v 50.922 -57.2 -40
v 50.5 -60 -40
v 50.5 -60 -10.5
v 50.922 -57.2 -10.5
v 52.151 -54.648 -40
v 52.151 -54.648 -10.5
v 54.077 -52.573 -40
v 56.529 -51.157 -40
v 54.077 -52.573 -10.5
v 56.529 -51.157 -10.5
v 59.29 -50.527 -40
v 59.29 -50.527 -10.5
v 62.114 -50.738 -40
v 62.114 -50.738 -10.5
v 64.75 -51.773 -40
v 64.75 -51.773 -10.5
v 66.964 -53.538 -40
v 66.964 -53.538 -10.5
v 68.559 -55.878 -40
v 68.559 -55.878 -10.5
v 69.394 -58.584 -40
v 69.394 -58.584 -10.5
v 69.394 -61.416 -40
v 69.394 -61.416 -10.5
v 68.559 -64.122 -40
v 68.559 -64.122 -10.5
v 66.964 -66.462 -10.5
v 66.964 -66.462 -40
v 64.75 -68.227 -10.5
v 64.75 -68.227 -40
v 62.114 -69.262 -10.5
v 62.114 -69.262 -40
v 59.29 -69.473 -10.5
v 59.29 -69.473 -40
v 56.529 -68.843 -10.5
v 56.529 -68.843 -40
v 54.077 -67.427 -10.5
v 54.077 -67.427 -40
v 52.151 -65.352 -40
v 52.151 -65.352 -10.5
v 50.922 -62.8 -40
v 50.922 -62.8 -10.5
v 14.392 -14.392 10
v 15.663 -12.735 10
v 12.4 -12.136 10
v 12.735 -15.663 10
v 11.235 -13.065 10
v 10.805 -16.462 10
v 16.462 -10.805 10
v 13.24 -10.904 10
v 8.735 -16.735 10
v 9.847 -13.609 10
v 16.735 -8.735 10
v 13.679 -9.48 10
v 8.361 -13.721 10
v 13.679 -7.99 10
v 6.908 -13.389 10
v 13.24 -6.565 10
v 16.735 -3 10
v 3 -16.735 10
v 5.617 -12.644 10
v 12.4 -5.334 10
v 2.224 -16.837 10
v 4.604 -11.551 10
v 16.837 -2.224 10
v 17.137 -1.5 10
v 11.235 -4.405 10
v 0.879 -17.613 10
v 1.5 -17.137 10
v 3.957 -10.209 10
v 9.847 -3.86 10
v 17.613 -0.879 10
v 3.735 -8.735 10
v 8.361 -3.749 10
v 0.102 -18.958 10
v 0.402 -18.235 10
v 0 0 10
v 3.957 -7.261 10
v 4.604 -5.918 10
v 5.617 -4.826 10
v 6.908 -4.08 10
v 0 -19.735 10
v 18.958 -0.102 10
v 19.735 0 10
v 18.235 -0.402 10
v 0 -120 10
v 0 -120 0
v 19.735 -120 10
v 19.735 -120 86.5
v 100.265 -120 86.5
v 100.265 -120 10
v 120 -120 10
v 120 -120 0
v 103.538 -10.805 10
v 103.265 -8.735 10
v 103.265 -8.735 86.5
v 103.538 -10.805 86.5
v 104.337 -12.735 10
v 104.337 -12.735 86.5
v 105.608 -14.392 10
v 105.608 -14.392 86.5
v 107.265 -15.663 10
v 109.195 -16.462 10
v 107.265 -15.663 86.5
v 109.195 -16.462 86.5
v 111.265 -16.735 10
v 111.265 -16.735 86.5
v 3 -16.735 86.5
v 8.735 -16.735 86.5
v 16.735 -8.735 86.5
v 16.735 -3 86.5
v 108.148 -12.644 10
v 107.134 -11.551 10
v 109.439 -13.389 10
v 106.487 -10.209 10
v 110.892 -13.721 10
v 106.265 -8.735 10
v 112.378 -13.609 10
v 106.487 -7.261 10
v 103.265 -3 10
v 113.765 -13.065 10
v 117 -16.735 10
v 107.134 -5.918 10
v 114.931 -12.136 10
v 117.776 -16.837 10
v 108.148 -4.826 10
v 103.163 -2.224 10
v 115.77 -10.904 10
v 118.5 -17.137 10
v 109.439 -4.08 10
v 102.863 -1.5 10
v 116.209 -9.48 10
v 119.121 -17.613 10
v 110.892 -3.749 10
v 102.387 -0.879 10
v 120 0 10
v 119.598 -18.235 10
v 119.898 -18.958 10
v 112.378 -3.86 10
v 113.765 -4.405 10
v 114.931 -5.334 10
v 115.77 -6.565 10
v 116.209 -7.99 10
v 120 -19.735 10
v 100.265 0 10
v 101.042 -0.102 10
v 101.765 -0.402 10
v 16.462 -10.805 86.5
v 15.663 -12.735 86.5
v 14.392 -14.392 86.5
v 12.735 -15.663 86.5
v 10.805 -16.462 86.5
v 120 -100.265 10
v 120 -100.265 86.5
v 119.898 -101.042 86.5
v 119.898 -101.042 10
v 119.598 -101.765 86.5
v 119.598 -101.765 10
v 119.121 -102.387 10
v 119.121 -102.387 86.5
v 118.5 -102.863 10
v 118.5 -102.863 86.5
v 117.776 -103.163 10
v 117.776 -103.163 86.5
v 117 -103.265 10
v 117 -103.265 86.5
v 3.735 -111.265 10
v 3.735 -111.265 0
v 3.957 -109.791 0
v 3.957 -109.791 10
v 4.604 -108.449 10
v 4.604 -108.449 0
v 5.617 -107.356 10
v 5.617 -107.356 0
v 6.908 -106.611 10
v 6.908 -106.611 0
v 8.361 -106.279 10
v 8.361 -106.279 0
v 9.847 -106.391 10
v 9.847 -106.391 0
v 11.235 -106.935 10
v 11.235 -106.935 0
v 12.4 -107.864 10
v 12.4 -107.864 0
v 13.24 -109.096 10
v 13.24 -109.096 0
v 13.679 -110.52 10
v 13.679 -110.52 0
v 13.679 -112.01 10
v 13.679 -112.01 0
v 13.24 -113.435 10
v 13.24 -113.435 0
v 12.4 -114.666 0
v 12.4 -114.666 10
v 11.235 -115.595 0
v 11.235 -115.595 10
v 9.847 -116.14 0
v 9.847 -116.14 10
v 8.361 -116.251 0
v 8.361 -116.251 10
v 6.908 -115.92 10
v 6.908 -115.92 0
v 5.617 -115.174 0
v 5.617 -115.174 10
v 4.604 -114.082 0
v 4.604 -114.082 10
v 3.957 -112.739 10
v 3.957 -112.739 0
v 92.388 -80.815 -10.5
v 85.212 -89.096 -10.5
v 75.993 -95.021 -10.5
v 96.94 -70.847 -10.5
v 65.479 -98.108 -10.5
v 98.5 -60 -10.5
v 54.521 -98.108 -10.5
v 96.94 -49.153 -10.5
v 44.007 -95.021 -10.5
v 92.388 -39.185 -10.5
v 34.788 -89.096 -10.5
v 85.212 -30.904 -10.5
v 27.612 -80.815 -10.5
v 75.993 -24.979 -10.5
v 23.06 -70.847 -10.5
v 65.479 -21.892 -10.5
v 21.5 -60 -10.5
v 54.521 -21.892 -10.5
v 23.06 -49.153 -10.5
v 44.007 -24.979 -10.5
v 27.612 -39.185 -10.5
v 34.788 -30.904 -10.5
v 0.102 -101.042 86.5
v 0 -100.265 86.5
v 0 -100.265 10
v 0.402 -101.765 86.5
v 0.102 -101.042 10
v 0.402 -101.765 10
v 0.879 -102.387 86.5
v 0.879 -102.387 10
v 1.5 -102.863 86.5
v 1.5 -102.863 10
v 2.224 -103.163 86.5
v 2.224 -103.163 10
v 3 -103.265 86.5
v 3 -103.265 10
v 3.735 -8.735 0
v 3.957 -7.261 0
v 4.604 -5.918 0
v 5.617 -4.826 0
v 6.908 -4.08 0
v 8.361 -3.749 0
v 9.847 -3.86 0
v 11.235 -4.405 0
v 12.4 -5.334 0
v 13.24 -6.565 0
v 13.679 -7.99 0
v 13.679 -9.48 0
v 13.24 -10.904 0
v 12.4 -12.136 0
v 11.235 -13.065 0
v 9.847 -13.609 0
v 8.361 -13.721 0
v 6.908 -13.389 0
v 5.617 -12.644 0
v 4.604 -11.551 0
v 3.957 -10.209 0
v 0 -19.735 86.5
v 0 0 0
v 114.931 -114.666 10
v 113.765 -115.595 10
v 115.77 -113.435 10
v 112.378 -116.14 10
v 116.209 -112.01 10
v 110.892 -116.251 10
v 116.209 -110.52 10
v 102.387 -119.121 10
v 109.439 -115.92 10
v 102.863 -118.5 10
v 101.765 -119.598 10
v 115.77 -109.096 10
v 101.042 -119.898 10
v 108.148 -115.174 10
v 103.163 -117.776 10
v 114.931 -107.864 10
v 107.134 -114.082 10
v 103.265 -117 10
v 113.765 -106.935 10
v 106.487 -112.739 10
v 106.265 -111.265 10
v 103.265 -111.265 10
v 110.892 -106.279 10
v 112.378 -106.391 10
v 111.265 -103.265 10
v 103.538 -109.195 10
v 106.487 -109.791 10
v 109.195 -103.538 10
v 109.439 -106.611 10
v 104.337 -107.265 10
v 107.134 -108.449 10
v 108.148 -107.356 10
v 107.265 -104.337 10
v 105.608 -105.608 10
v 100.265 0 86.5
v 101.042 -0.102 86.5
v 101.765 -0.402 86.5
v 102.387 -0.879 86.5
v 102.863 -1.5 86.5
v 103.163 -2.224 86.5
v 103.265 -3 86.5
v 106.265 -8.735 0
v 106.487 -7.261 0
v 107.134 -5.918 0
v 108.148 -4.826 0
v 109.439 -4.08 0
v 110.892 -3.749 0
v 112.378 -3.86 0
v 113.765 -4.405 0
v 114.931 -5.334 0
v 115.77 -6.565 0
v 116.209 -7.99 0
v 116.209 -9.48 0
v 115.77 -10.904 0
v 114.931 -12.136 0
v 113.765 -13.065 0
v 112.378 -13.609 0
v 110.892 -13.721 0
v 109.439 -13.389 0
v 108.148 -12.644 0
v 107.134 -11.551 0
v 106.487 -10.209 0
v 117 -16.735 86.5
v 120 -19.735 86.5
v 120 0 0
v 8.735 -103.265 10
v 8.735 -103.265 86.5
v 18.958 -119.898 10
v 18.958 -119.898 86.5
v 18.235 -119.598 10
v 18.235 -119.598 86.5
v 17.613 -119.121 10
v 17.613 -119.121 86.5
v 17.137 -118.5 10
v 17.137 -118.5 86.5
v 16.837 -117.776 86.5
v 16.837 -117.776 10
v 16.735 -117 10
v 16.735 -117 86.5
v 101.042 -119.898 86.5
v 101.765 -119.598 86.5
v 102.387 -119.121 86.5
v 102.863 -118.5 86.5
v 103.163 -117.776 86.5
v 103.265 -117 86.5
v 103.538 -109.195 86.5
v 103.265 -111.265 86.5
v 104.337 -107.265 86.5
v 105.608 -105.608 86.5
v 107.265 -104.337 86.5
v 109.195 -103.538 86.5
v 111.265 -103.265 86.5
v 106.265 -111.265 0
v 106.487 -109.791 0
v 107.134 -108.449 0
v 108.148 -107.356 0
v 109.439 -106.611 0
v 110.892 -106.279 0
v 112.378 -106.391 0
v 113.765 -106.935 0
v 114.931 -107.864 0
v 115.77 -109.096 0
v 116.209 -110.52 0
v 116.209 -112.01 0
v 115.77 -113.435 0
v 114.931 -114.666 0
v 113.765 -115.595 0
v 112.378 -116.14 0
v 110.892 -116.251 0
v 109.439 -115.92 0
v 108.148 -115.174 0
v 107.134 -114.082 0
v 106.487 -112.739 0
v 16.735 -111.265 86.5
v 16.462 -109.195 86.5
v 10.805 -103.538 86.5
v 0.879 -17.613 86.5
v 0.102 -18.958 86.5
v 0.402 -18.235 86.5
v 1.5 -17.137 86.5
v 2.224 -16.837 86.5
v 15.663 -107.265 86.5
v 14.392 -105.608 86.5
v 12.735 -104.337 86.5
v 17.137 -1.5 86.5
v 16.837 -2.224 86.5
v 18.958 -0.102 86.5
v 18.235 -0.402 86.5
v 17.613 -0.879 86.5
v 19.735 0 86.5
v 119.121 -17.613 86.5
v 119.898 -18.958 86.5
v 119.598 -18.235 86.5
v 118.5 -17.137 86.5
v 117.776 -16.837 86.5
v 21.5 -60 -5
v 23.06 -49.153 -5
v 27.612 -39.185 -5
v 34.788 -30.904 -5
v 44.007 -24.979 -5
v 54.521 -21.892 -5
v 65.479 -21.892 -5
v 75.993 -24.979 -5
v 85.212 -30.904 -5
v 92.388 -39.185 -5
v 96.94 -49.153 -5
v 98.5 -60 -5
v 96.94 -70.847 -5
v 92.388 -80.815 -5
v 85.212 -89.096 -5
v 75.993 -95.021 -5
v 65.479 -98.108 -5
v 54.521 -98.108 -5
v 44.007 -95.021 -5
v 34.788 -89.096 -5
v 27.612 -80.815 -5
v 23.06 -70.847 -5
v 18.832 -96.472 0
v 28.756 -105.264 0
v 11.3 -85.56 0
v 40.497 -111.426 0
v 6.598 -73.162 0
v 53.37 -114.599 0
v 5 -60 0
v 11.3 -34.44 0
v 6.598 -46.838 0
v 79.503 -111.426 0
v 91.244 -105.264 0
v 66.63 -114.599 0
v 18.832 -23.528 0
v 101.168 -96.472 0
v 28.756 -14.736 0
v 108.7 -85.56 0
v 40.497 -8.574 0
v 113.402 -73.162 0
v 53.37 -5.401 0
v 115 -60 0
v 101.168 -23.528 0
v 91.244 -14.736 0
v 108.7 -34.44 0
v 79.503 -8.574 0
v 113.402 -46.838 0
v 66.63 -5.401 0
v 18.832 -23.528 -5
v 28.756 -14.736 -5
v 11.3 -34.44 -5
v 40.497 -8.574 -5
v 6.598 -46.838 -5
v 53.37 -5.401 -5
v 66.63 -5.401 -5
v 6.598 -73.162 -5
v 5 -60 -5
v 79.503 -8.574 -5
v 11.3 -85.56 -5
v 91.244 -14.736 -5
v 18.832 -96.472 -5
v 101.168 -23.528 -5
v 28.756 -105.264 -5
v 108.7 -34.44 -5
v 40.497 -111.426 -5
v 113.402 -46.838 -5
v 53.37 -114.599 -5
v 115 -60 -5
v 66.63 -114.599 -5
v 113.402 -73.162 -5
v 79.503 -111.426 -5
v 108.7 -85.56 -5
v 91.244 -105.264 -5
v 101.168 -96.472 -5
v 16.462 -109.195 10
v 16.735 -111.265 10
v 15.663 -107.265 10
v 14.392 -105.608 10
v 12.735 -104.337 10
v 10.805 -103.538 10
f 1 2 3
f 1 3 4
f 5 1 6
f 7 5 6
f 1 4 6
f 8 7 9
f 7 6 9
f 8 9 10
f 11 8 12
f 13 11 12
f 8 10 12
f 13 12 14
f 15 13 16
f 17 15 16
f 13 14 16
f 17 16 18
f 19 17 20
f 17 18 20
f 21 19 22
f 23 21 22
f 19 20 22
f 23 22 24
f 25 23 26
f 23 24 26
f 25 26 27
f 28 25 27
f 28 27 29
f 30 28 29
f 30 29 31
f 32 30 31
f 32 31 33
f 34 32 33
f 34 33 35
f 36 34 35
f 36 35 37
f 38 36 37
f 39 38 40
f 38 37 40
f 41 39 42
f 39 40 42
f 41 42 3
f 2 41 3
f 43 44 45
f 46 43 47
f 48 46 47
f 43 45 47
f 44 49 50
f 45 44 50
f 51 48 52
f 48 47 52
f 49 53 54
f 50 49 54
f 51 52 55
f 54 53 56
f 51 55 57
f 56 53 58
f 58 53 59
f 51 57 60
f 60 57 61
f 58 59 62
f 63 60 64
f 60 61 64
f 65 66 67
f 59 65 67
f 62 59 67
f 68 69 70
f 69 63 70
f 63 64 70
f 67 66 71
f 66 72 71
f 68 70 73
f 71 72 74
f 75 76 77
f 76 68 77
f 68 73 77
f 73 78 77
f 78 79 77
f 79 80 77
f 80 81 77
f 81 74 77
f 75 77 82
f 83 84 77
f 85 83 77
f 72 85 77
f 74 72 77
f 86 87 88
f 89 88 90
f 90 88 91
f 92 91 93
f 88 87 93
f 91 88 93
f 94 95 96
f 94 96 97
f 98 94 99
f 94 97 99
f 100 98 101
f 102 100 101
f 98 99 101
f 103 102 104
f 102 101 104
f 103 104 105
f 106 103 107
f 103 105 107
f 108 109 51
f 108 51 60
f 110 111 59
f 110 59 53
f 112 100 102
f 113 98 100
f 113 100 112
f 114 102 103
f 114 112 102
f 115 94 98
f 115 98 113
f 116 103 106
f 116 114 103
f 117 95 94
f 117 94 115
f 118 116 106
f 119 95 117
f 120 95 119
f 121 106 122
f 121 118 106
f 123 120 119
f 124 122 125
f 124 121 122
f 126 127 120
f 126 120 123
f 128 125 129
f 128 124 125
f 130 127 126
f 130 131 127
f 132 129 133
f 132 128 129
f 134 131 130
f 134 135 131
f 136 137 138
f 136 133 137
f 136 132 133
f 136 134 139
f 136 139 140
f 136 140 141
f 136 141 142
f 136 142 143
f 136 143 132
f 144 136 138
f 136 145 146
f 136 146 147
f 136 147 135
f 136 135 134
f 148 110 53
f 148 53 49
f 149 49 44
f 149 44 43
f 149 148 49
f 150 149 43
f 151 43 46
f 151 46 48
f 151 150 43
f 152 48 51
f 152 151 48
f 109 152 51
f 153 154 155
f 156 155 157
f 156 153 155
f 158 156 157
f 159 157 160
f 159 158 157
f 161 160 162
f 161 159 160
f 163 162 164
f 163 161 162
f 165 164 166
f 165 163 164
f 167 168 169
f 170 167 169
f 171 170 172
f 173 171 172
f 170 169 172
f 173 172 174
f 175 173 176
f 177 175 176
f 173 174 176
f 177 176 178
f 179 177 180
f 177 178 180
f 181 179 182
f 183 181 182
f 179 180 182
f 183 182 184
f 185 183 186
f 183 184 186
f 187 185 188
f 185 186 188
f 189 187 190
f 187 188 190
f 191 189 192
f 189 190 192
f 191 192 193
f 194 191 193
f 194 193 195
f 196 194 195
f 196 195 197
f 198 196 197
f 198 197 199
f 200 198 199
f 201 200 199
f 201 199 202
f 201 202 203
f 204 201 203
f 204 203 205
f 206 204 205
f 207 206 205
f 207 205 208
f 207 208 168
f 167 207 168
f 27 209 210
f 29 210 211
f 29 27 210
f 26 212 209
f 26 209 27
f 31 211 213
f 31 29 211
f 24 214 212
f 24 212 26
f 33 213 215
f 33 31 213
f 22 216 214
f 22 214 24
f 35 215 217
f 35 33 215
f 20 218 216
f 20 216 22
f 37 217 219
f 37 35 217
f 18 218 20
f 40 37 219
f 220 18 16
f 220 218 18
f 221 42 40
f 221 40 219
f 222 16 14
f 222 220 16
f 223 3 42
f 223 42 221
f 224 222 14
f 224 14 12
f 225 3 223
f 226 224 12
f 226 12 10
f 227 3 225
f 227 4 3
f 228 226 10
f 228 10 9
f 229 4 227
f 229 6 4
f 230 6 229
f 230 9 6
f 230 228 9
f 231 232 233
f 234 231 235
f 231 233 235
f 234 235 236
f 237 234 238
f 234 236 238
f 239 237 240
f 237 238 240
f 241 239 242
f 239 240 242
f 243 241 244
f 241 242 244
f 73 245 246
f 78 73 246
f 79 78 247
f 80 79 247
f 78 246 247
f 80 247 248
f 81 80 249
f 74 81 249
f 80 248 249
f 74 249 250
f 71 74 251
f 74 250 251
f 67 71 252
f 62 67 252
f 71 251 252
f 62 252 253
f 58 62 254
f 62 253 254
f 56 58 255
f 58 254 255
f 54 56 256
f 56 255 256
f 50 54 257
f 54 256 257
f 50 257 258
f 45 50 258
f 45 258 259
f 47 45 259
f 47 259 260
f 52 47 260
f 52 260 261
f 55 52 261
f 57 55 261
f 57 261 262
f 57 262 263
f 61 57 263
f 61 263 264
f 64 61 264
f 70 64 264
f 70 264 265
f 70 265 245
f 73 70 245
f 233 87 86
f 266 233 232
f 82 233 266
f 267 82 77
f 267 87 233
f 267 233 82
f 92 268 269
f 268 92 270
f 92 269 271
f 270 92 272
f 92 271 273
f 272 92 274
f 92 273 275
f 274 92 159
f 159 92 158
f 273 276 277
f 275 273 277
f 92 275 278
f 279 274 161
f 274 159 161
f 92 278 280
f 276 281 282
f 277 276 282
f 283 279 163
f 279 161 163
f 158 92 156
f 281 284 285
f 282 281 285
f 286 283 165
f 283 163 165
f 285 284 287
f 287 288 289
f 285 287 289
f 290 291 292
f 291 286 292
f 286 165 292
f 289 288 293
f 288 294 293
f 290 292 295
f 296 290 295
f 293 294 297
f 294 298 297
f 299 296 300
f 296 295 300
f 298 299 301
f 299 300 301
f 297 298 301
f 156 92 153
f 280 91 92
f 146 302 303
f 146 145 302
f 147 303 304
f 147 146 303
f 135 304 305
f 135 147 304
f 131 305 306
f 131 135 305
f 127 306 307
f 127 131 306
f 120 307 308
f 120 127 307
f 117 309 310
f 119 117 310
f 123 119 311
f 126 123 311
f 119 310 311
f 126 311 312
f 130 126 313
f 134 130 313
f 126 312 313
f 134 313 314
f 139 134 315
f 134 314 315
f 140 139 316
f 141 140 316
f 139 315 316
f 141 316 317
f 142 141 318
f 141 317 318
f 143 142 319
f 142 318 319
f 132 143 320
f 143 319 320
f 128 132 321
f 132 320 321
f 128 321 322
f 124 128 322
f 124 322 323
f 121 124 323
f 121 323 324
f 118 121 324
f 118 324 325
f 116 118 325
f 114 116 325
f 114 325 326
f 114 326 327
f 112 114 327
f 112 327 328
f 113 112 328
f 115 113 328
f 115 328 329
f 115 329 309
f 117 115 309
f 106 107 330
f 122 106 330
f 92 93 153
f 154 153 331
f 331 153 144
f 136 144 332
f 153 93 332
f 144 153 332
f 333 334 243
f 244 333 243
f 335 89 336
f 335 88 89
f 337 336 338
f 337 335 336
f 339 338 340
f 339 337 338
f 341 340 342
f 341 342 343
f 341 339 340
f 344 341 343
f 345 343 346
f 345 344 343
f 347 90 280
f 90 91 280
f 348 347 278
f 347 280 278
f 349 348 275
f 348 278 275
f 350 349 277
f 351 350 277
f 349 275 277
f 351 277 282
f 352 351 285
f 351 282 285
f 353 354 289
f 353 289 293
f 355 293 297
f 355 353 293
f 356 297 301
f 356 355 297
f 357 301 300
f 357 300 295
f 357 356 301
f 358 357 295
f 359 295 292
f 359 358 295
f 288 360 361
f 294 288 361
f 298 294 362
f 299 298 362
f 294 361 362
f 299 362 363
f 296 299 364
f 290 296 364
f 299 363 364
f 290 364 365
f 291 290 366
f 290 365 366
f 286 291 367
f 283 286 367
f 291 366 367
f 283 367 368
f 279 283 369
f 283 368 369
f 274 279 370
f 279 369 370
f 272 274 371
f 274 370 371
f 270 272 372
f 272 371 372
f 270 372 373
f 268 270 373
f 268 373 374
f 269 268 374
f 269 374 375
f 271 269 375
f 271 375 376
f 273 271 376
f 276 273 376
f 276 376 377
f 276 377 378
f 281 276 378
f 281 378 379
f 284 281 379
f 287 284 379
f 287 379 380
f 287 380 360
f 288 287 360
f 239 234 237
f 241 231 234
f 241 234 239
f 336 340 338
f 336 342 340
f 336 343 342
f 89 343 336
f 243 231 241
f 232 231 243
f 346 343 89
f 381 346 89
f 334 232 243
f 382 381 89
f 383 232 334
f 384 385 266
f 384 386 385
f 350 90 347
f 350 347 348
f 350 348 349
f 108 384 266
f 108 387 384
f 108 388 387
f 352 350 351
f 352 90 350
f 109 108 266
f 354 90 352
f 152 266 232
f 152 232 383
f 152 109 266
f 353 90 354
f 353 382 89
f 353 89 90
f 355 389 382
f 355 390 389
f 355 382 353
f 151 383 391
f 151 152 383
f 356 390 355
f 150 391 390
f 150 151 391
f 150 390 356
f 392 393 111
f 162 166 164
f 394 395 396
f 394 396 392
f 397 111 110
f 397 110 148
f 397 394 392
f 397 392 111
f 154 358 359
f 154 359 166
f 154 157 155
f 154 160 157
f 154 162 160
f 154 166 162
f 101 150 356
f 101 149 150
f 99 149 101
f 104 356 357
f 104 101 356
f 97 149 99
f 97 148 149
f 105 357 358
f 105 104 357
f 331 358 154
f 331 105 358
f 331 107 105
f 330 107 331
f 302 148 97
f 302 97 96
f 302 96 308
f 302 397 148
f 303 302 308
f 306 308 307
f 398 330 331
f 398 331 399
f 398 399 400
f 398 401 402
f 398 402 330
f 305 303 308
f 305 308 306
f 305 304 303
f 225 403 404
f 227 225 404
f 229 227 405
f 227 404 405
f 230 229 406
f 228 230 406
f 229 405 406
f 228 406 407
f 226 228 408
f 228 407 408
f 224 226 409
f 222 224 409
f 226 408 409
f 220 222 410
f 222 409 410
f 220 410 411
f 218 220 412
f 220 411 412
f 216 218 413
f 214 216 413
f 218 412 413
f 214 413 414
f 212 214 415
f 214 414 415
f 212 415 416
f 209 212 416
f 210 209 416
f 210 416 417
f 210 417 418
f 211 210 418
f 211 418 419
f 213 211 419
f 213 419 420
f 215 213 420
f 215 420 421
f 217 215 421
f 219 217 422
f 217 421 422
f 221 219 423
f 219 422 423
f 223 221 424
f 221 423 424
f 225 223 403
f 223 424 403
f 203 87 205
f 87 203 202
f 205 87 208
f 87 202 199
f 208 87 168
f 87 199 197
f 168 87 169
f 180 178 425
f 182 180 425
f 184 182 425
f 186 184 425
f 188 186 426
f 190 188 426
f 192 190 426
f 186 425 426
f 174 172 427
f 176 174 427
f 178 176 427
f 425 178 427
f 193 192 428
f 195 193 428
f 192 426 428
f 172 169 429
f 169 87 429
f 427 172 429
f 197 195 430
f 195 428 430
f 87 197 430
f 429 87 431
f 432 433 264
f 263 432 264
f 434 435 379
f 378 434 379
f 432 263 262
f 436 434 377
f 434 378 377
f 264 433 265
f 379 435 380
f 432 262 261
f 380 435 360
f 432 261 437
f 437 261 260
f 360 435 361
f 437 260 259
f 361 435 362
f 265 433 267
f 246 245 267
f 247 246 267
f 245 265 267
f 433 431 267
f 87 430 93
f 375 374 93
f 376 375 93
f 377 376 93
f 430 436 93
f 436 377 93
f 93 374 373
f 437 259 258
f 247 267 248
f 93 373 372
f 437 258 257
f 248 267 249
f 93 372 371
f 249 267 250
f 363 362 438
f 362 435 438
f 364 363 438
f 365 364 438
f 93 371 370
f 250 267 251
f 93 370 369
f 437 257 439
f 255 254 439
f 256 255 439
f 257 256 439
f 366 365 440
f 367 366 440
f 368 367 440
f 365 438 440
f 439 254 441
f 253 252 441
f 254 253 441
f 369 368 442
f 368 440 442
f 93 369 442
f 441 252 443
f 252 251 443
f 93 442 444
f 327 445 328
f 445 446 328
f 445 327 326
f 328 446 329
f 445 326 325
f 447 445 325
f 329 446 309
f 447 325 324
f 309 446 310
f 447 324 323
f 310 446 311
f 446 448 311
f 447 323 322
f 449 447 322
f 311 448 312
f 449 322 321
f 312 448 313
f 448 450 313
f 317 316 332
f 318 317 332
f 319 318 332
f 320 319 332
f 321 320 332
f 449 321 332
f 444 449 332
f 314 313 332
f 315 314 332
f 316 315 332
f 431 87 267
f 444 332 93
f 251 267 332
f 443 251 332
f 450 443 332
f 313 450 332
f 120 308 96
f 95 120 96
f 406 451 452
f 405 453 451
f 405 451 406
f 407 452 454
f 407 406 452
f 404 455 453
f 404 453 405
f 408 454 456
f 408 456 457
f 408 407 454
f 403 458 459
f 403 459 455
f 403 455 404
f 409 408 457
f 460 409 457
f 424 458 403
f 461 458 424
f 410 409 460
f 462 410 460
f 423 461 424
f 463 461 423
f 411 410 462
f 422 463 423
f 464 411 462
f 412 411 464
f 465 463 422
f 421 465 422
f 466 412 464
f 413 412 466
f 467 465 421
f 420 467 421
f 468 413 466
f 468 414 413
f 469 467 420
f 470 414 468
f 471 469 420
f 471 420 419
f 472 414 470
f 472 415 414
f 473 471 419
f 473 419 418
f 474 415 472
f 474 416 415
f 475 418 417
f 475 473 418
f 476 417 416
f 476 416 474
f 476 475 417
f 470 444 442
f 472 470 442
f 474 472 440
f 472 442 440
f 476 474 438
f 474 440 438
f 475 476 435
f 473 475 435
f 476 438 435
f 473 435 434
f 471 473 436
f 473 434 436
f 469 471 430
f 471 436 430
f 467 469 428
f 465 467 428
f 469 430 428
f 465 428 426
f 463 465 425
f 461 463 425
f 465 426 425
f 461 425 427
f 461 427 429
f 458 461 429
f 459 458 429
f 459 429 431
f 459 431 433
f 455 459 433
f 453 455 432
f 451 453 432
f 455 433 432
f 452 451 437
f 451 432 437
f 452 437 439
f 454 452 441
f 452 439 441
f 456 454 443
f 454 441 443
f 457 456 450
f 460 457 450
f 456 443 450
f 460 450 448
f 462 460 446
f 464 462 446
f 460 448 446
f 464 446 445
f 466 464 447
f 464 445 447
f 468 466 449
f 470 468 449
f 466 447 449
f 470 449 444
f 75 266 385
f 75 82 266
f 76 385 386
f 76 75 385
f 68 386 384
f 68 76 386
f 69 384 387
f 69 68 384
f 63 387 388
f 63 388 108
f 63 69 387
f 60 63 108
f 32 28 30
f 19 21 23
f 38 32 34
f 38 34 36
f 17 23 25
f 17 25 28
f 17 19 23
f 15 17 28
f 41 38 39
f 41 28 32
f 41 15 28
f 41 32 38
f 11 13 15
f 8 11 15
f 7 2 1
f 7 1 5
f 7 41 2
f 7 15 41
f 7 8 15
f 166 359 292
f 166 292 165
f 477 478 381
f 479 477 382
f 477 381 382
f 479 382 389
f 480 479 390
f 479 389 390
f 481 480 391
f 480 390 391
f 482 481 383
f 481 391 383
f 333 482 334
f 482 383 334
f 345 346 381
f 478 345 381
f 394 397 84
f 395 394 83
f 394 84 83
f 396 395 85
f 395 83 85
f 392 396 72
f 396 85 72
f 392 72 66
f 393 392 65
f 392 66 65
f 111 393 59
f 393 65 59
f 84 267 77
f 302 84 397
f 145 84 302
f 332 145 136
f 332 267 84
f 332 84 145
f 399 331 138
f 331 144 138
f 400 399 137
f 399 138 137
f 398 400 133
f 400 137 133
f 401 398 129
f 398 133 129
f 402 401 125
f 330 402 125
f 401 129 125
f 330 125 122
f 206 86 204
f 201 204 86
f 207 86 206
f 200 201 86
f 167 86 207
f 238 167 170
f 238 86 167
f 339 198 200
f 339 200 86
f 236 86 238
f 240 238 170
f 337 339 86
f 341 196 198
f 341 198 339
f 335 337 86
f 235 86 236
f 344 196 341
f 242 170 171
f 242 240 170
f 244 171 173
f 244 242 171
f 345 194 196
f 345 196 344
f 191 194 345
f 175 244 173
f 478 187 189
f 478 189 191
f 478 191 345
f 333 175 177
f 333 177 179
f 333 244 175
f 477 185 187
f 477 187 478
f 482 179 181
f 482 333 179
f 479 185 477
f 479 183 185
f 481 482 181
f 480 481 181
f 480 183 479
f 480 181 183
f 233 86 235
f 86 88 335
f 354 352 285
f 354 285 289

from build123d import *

# Parameters (mm, degrees)
SKETCH_1_W          = 120
SKETCH_1_H          = 120
EXTRUDE_1_DEPTH     = 86.5
SKETCH_2_R          = 55
EXTRUDE_2_DEPTH     = 5
SKETCH_3_R          = 38.5
EXTRUDE_3_DEPTH     = 5.5
SKETCH_4_R          = 9.5
EXTRUDE_4_DEPTH     = 29.5
SKETCH_5_R          = 5
CUT_EXTRUDE_1_DEPTH = 191.479001467
CUT_EXTRUDE_2_DEPTH = 76.5
FILLET_1_R          = 3


with BuildPart() as part:
    # 草图1 → 拉伸1 (new body)
    with BuildSketch(Plane.XY):
        with Locations((60, -60)):
            Rectangle(SKETCH_1_W, SKETCH_1_H)
    extrude(amount=EXTRUDE_1_DEPTH)

    # 草图2 → 拉伸2 (add)
    with BuildSketch(Plane(origin=(0, 0, 0), x_dir=(-1, 0, 0), z_dir=(0, 0, -1))):
        with Locations(Location((-60, -60, 0), (0, 0, 180))):
            Circle(SKETCH_2_R)
    extrude(amount=EXTRUDE_2_DEPTH)

    # 草图3 → 拉伸3 (add)
    with BuildSketch(Plane(origin=(0, 0, -5), x_dir=(-1, 0, 0), z_dir=(0, 0, -1))):
        with Locations((-60, -60)):
            Circle(SKETCH_3_R)
    extrude(amount=EXTRUDE_3_DEPTH)

    # 草图4 → 拉伸4 (add)
    with BuildSketch(Plane(origin=(0, 0, -10.5), x_dir=(-1, 0, 0), z_dir=(0, 0, -1))):
        with Locations((-60, -60)):
            Circle(SKETCH_4_R)
    extrude(amount=EXTRUDE_4_DEPTH)

    # 草图5 → 切除-拉伸1 (cut, through all)
    with BuildSketch(Plane(origin=(0, 0, 0), x_dir=(-1, 0, 0), z_dir=(0, 0, -1))):
        with Locations((-8.734758364, -111.265241636)):
            Circle(SKETCH_5_R)
        with Locations((-8.734758364, -8.734758364)):
            Circle(SKETCH_5_R)
        with Locations((-111.265241636, -111.265241636)):
            Circle(SKETCH_5_R)
        with Locations((-111.265241636, -8.734758364)):
            Circle(SKETCH_5_R)
    extrude(amount=-CUT_EXTRUDE_1_DEPTH, mode=Mode.SUBTRACT)

    # 草图6 → 切除-拉伸2 (cut)
    with BuildSketch(Plane.XY.offset(86.5)):
        with BuildLine():
            Line((8.734758364, -16.734758364), (0, -16.734758364))
            Line((0, -16.734758364), (0, 0))
            Line((0, 0), (16.734758364, 0))
            Line((16.734758364, 0), (16.734758364, -8.734758364))
            ThreePointArc((16.734758364, -8.734758364), (14.391612613, -14.391612613), (8.734758364, -16.734758364))
        make_face()
        with BuildLine():
            Line((111.265241636, -103.265241636), (120, -103.265241636))
            Line((120, -103.265241636), (120, -120))
            Line((120, -120), (103.265241636, -120))
            Line((103.265241636, -120), (103.265241636, -111.265241636))
            ThreePointArc((103.265241636, -111.265241636), (105.608387387, -105.608387387), (111.265241636, -103.265241636))
        make_face()
        with BuildLine():
            Line((120, 0), (103.265241636, 0))
            Line((103.265241636, 0), (103.265241636, -8.734758364))
            ThreePointArc((103.265241636, -8.734758364), (105.608387387, -14.391612613), (111.265241636, -16.734758364))
            Line((111.265241636, -16.734758364), (120, -16.734758364))
            Line((120, -16.734758364), (120, 0))
        make_face()
        with BuildLine():
            Line((0, -120), (16.734758364, -120))
            Line((16.734758364, -120), (16.734758364, -111.265241636))
            ThreePointArc((16.734758364, -111.265241636), (14.391612613, -105.608387387), (8.734758364, -103.265241636))
            Line((8.734758364, -103.265241636), (0, -103.265241636))
            Line((0, -103.265241636), (0, -120))
        make_face()
    extrude(amount=-CUT_EXTRUDE_2_DEPTH, mode=Mode.SUBTRACT)

    # 圆角1
    fillet_1_edges = [part.edges().sort_by_distance(p)[0] for p in [
        (103.265241636, 0, 48.25),
        (120, -16.734758364, 48.25),
        (16.734758364, 0, 48.25),
        (0, -16.734758364, 48.25),
        (120, -103.265241636, 48.25),
        (103.265241636, -120, 48.25),
        (16.734758364, -120, 48.25),
        (0, -103.265241636, 48.25),
    ]]
    fillet(fillet_1_edges, radius=FILLET_1_R)


solid = part.part
